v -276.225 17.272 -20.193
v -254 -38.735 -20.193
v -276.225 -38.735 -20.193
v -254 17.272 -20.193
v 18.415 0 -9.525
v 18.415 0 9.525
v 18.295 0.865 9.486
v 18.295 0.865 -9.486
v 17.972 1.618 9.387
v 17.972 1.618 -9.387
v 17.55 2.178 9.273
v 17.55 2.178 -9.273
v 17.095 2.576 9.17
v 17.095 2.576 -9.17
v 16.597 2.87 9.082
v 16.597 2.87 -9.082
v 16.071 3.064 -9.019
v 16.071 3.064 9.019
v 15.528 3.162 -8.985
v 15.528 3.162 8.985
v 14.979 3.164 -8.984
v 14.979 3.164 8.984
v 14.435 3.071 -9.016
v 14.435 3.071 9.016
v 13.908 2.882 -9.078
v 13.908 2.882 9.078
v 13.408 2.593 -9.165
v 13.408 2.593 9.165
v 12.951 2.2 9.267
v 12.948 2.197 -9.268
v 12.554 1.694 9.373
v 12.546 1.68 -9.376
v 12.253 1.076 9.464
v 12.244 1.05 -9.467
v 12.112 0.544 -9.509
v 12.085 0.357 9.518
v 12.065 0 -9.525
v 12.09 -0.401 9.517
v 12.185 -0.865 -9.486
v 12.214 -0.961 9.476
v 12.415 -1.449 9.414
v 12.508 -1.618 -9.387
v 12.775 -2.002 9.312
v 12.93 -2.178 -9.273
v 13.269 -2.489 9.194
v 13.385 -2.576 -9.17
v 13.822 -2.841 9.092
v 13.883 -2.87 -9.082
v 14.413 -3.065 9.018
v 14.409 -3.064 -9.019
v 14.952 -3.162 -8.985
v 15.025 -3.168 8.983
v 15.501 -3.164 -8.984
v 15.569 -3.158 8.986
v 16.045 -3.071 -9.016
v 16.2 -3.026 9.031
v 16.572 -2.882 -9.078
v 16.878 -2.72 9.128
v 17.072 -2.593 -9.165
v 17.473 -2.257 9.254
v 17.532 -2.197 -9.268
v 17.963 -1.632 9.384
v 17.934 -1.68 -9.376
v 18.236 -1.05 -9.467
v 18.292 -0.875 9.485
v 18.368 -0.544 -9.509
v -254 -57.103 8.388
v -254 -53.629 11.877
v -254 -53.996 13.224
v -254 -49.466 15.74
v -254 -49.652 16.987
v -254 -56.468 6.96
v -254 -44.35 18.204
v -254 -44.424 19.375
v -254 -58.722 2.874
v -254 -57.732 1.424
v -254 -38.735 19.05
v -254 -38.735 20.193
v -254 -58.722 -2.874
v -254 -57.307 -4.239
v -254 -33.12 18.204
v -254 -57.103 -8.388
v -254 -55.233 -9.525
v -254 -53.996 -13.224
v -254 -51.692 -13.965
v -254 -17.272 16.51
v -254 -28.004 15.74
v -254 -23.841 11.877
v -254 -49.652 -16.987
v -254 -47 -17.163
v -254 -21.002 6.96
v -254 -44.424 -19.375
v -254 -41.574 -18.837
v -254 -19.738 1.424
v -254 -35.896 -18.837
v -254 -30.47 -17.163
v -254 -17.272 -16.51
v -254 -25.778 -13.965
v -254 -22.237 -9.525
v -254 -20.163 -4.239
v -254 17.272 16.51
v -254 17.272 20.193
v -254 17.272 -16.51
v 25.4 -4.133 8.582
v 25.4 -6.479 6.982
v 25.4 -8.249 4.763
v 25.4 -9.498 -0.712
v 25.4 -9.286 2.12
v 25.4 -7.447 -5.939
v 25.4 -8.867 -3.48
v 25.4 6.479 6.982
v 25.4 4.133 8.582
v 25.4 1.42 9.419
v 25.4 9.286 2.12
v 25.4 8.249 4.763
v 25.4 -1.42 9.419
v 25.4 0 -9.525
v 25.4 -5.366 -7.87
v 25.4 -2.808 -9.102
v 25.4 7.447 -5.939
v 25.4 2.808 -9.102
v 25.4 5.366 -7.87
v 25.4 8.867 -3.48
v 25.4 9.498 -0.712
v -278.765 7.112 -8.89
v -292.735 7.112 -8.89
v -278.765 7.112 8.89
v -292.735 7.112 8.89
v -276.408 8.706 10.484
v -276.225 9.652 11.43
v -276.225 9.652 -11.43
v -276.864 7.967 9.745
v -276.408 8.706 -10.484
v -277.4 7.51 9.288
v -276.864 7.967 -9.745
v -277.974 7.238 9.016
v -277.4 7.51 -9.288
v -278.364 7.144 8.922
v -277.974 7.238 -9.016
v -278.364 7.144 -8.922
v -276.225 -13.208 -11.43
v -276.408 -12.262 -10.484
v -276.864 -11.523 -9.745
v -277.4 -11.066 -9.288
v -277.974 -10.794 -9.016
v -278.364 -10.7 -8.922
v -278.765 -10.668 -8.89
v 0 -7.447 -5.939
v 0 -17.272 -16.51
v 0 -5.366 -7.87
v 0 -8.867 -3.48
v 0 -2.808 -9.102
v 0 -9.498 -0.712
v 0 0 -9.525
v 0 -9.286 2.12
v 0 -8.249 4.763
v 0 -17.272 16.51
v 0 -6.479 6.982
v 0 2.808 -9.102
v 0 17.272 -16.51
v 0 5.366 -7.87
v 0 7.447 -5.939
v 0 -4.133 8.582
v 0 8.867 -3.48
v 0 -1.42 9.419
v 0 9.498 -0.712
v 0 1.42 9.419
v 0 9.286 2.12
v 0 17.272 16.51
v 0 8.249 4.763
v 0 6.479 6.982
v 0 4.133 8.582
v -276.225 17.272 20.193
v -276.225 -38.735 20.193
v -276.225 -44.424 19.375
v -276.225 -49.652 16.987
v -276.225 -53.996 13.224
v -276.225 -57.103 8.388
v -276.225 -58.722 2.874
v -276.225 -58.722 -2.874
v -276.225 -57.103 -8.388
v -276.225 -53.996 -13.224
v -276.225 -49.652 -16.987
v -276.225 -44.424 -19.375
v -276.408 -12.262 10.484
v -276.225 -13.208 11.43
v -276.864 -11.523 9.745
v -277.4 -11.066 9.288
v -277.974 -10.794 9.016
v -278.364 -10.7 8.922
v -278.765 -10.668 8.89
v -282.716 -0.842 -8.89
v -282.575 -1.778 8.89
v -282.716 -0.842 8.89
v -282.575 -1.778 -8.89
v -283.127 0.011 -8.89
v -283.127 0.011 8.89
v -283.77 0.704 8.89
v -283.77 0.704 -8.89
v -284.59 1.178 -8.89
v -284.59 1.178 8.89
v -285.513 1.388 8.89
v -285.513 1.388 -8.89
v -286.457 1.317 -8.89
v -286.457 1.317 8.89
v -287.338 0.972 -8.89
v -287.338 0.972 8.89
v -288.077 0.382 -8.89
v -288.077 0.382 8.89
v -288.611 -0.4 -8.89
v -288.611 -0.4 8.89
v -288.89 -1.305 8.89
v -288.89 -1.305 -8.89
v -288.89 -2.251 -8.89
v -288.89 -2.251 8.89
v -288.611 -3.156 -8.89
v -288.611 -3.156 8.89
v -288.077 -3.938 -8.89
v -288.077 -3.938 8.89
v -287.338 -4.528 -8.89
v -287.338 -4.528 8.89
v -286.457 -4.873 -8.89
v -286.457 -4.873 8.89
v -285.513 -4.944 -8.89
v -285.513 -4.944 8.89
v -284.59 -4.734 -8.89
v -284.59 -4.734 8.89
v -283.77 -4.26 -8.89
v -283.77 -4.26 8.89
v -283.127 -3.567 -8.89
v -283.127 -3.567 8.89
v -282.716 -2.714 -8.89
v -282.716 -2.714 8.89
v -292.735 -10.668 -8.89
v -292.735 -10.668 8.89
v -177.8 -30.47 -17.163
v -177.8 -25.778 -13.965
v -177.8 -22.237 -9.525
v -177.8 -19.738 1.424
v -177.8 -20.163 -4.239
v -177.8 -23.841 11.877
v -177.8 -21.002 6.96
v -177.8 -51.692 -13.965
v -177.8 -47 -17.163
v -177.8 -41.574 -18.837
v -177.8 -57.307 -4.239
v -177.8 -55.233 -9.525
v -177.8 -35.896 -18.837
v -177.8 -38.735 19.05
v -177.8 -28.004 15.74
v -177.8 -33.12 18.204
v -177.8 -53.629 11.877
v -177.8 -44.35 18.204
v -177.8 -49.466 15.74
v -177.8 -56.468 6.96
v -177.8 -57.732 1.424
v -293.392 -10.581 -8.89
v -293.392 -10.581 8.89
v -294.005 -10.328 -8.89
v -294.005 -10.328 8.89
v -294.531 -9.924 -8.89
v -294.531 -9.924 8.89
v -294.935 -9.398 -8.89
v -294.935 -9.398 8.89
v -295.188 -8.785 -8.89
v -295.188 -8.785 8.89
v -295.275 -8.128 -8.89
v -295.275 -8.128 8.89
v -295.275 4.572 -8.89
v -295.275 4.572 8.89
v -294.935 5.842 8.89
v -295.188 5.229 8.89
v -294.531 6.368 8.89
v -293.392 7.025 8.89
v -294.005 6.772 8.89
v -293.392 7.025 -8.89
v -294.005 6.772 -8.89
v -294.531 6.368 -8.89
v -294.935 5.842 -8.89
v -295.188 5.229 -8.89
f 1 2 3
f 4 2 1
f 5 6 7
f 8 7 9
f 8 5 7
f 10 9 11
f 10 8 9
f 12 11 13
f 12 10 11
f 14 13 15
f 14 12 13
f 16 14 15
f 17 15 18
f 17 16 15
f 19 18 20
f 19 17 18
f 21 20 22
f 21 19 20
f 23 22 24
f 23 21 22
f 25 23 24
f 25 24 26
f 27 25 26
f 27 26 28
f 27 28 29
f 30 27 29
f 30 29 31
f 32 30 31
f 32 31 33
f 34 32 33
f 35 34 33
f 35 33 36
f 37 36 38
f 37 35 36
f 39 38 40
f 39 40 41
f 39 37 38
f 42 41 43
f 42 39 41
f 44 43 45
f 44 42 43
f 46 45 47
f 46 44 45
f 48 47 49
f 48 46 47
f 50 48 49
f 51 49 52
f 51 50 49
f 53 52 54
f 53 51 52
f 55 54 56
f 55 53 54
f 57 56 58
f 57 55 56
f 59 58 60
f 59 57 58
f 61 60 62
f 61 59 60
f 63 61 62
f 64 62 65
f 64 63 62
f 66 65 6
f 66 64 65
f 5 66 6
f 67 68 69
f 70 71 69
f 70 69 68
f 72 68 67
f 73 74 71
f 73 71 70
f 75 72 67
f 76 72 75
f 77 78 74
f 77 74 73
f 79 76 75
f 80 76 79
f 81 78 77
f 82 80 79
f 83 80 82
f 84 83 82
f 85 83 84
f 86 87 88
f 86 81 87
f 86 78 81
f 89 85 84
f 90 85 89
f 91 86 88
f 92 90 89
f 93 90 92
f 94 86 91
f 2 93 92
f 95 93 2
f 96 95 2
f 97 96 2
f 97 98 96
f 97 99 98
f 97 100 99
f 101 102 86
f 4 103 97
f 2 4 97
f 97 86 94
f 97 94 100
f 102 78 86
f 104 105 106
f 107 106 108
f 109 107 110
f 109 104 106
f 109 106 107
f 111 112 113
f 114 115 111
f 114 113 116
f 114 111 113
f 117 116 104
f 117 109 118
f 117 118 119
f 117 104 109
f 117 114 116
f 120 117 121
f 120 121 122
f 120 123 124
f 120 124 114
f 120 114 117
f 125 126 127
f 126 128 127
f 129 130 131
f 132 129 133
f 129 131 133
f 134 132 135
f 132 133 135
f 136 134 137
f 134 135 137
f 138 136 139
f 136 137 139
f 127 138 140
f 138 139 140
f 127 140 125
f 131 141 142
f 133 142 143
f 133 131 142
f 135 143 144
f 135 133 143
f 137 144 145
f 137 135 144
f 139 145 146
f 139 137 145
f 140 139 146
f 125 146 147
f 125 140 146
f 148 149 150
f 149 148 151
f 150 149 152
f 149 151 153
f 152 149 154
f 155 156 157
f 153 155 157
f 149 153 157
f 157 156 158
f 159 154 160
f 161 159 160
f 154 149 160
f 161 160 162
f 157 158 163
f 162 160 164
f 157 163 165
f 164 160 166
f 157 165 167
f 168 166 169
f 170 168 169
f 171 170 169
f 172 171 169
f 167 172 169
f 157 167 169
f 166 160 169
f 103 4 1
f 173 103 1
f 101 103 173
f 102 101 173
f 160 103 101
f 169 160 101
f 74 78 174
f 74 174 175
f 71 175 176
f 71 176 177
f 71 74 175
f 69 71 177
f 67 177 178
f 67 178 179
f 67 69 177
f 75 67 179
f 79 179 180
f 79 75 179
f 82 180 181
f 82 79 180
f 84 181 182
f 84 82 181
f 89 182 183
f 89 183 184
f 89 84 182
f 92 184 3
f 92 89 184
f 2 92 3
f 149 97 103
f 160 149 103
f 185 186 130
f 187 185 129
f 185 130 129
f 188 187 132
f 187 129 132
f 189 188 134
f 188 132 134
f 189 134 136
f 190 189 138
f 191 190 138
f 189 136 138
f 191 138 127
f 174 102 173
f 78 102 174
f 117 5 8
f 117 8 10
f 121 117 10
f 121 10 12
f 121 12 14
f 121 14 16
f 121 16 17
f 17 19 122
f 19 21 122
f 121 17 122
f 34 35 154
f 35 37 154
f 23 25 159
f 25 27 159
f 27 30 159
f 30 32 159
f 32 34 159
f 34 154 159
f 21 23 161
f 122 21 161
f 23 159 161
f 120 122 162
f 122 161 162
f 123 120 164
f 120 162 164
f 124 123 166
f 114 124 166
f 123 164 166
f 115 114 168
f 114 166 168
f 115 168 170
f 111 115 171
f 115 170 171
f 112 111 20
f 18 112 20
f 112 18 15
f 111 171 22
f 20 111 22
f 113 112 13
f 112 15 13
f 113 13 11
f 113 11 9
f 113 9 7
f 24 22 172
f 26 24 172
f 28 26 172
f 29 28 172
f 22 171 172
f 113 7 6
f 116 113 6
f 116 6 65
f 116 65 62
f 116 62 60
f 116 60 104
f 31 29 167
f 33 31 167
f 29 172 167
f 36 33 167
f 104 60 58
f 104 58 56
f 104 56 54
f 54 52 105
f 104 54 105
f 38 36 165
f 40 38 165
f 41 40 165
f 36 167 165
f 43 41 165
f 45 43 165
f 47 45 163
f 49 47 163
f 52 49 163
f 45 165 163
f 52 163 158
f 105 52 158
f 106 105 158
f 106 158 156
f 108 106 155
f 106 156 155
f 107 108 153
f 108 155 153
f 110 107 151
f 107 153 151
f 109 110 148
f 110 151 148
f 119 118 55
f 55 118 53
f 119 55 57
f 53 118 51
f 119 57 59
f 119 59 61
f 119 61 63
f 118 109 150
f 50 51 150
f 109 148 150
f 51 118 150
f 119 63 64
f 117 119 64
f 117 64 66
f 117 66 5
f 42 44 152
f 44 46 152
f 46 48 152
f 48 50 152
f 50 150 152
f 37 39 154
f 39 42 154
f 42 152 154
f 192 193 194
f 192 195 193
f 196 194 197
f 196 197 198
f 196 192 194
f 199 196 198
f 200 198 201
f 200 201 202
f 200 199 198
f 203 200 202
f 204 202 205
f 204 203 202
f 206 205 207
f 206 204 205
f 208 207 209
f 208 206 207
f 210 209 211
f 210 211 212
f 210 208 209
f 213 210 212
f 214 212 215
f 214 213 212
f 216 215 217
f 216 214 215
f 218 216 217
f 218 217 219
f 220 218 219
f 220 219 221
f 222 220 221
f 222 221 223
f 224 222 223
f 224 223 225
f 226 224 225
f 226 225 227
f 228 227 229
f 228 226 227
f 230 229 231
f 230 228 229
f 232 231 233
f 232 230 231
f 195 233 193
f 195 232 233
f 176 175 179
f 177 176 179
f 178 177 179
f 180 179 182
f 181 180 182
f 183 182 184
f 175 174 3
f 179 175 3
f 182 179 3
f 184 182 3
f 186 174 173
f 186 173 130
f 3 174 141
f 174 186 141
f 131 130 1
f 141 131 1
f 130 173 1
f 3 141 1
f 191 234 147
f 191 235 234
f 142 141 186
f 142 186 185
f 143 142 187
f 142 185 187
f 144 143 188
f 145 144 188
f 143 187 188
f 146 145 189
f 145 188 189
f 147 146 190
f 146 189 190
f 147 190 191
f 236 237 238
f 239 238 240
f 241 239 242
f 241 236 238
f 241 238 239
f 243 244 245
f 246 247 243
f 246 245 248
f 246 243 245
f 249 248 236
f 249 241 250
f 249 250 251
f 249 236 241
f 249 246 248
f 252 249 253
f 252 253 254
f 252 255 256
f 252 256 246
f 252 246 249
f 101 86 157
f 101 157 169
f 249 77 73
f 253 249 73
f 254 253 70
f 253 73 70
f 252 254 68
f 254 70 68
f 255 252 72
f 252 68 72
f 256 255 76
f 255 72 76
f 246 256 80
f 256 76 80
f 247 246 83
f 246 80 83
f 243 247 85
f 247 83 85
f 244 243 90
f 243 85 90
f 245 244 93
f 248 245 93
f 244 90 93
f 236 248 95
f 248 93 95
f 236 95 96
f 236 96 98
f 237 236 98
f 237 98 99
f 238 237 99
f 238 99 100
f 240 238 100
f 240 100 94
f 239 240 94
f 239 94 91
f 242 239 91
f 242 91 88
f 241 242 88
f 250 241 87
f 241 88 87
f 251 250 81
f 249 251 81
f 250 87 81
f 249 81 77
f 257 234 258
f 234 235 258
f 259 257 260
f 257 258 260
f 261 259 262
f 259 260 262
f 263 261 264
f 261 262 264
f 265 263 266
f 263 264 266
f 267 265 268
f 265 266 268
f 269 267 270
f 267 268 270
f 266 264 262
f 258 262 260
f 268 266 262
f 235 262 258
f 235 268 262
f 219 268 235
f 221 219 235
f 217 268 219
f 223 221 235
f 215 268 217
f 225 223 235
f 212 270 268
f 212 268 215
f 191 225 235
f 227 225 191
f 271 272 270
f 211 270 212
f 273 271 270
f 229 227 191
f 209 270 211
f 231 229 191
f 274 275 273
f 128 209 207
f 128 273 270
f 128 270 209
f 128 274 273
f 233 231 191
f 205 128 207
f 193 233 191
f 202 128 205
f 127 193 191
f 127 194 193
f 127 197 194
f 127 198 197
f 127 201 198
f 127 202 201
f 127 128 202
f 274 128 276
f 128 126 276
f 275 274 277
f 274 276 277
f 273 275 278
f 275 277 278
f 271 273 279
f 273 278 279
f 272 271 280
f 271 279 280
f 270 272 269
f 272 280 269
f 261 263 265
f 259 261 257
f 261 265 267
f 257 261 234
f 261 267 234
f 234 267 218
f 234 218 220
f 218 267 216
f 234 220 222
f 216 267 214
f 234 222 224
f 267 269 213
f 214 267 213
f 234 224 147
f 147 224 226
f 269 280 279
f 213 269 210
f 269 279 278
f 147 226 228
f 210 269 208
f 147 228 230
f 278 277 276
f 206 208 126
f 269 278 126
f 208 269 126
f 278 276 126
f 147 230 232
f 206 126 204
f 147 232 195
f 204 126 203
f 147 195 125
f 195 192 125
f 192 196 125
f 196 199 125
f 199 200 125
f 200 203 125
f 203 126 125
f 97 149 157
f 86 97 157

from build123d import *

# Parameters (mm, degrees)
SKETCH1_R               = 9.525
BOSS_EXTRUDE1_DEPTH     = 25.4
CUT_EXTRUDE1_DEPTH      = 29.750847814
CUT_EXTRUDE1_DEPTH_BACK = 29.750847814
SKETCH2_R               = 3.175
SKETCH3_W               = 33.02
SKETCH3_H               = 34.544
BOSS_EXTRUDE2_DEPTH     = 254
BOSS_EXTRUDE3_DEPTH     = 22.225
SKETCH5_R               = 19.05
BOSS_EXTRUDE4_DEPTH     = 76.2
SKETCH6_W               = 19.05
SKETCH6_H               = 17.78
SKETCH6_R               = 3.175
BOSS_EXTRUDE5_DEPTH     = 8.89
FILLET1_R               = 2.54


with BuildPart() as part:
    # Sketch1 → Boss-Extrude1 (new body)
    with BuildSketch(Plane(origin=(0, 0, 0), x_dir=(0, 0, -1), z_dir=(1, 0, 0))):
        Circle(SKETCH1_R)
    extrude(amount=BOSS_EXTRUDE1_DEPTH)

    # Sketch2 → Cut-Extrude1 (cut, two sides: drawn at the far end of the back side and taken through both)
    with BuildSketch(Plane.XY.offset(-CUT_EXTRUDE1_DEPTH_BACK)):
        with Locations((15.24, 0)):
            Circle(SKETCH2_R)
    extrude(amount=CUT_EXTRUDE1_DEPTH + CUT_EXTRUDE1_DEPTH_BACK, mode=Mode.SUBTRACT)

    # Sketch3 → Boss-Extrude2 (add)
    with BuildSketch(Plane.ZY):
        Rectangle(SKETCH3_W, SKETCH3_H)
    extrude(amount=BOSS_EXTRUDE2_DEPTH)

    # Sketch4 → Boss-Extrude3 (add)
    with BuildSketch(Plane.ZY.offset(254)):
        with BuildLine():
            Line((-20.193, 17.272), (20.193, 17.272))
            Line((20.193, 17.272), (20.193, -38.735))
            ThreePointArc((20.193, -38.735), (0, -58.928), (-20.193, -38.735))
            Line((-20.193, -38.735), (-20.193, 17.272))
        make_face()
    extrude(amount=BOSS_EXTRUDE3_DEPTH)

    # Sketch5 → Boss-Extrude4 (add)
    with BuildSketch(Plane(origin=(-254, 0, 0), x_dir=(0, 0, -1), z_dir=(1, 0, 0))):
        with Locations(Location((0, -38.735, 0), (0, 0, 180))):
            Circle(SKETCH5_R)
    extrude(amount=BOSS_EXTRUDE4_DEPTH)

    # Sketch6 → Boss-Extrude5 (add, symmetric)
    with BuildSketch(Plane.XY):
        with Locations((-285.75, -1.778)):
            Rectangle(SKETCH6_W, SKETCH6_H)
        with Locations((-285.75, -1.778)):
            Circle(SKETCH6_R, mode=Mode.SUBTRACT)
    extrude(amount=BOSS_EXTRUDE5_DEPTH, both=True)

    # Fillet1
    fillet1_edges = [part.edges().sort_by_distance(p)[0] for p in [
        (-276.225, -1.778, 8.89),
        (-276.225, -1.778, -8.89),
        (-276.225, -10.668, 0),
        (-276.225, 7.112, 0),
        (-295.275, 7.112, 0),
        (-295.275, -10.668, 0),
    ]]
    fillet(fillet1_edges, radius=FILLET1_R)


solid = part.part
